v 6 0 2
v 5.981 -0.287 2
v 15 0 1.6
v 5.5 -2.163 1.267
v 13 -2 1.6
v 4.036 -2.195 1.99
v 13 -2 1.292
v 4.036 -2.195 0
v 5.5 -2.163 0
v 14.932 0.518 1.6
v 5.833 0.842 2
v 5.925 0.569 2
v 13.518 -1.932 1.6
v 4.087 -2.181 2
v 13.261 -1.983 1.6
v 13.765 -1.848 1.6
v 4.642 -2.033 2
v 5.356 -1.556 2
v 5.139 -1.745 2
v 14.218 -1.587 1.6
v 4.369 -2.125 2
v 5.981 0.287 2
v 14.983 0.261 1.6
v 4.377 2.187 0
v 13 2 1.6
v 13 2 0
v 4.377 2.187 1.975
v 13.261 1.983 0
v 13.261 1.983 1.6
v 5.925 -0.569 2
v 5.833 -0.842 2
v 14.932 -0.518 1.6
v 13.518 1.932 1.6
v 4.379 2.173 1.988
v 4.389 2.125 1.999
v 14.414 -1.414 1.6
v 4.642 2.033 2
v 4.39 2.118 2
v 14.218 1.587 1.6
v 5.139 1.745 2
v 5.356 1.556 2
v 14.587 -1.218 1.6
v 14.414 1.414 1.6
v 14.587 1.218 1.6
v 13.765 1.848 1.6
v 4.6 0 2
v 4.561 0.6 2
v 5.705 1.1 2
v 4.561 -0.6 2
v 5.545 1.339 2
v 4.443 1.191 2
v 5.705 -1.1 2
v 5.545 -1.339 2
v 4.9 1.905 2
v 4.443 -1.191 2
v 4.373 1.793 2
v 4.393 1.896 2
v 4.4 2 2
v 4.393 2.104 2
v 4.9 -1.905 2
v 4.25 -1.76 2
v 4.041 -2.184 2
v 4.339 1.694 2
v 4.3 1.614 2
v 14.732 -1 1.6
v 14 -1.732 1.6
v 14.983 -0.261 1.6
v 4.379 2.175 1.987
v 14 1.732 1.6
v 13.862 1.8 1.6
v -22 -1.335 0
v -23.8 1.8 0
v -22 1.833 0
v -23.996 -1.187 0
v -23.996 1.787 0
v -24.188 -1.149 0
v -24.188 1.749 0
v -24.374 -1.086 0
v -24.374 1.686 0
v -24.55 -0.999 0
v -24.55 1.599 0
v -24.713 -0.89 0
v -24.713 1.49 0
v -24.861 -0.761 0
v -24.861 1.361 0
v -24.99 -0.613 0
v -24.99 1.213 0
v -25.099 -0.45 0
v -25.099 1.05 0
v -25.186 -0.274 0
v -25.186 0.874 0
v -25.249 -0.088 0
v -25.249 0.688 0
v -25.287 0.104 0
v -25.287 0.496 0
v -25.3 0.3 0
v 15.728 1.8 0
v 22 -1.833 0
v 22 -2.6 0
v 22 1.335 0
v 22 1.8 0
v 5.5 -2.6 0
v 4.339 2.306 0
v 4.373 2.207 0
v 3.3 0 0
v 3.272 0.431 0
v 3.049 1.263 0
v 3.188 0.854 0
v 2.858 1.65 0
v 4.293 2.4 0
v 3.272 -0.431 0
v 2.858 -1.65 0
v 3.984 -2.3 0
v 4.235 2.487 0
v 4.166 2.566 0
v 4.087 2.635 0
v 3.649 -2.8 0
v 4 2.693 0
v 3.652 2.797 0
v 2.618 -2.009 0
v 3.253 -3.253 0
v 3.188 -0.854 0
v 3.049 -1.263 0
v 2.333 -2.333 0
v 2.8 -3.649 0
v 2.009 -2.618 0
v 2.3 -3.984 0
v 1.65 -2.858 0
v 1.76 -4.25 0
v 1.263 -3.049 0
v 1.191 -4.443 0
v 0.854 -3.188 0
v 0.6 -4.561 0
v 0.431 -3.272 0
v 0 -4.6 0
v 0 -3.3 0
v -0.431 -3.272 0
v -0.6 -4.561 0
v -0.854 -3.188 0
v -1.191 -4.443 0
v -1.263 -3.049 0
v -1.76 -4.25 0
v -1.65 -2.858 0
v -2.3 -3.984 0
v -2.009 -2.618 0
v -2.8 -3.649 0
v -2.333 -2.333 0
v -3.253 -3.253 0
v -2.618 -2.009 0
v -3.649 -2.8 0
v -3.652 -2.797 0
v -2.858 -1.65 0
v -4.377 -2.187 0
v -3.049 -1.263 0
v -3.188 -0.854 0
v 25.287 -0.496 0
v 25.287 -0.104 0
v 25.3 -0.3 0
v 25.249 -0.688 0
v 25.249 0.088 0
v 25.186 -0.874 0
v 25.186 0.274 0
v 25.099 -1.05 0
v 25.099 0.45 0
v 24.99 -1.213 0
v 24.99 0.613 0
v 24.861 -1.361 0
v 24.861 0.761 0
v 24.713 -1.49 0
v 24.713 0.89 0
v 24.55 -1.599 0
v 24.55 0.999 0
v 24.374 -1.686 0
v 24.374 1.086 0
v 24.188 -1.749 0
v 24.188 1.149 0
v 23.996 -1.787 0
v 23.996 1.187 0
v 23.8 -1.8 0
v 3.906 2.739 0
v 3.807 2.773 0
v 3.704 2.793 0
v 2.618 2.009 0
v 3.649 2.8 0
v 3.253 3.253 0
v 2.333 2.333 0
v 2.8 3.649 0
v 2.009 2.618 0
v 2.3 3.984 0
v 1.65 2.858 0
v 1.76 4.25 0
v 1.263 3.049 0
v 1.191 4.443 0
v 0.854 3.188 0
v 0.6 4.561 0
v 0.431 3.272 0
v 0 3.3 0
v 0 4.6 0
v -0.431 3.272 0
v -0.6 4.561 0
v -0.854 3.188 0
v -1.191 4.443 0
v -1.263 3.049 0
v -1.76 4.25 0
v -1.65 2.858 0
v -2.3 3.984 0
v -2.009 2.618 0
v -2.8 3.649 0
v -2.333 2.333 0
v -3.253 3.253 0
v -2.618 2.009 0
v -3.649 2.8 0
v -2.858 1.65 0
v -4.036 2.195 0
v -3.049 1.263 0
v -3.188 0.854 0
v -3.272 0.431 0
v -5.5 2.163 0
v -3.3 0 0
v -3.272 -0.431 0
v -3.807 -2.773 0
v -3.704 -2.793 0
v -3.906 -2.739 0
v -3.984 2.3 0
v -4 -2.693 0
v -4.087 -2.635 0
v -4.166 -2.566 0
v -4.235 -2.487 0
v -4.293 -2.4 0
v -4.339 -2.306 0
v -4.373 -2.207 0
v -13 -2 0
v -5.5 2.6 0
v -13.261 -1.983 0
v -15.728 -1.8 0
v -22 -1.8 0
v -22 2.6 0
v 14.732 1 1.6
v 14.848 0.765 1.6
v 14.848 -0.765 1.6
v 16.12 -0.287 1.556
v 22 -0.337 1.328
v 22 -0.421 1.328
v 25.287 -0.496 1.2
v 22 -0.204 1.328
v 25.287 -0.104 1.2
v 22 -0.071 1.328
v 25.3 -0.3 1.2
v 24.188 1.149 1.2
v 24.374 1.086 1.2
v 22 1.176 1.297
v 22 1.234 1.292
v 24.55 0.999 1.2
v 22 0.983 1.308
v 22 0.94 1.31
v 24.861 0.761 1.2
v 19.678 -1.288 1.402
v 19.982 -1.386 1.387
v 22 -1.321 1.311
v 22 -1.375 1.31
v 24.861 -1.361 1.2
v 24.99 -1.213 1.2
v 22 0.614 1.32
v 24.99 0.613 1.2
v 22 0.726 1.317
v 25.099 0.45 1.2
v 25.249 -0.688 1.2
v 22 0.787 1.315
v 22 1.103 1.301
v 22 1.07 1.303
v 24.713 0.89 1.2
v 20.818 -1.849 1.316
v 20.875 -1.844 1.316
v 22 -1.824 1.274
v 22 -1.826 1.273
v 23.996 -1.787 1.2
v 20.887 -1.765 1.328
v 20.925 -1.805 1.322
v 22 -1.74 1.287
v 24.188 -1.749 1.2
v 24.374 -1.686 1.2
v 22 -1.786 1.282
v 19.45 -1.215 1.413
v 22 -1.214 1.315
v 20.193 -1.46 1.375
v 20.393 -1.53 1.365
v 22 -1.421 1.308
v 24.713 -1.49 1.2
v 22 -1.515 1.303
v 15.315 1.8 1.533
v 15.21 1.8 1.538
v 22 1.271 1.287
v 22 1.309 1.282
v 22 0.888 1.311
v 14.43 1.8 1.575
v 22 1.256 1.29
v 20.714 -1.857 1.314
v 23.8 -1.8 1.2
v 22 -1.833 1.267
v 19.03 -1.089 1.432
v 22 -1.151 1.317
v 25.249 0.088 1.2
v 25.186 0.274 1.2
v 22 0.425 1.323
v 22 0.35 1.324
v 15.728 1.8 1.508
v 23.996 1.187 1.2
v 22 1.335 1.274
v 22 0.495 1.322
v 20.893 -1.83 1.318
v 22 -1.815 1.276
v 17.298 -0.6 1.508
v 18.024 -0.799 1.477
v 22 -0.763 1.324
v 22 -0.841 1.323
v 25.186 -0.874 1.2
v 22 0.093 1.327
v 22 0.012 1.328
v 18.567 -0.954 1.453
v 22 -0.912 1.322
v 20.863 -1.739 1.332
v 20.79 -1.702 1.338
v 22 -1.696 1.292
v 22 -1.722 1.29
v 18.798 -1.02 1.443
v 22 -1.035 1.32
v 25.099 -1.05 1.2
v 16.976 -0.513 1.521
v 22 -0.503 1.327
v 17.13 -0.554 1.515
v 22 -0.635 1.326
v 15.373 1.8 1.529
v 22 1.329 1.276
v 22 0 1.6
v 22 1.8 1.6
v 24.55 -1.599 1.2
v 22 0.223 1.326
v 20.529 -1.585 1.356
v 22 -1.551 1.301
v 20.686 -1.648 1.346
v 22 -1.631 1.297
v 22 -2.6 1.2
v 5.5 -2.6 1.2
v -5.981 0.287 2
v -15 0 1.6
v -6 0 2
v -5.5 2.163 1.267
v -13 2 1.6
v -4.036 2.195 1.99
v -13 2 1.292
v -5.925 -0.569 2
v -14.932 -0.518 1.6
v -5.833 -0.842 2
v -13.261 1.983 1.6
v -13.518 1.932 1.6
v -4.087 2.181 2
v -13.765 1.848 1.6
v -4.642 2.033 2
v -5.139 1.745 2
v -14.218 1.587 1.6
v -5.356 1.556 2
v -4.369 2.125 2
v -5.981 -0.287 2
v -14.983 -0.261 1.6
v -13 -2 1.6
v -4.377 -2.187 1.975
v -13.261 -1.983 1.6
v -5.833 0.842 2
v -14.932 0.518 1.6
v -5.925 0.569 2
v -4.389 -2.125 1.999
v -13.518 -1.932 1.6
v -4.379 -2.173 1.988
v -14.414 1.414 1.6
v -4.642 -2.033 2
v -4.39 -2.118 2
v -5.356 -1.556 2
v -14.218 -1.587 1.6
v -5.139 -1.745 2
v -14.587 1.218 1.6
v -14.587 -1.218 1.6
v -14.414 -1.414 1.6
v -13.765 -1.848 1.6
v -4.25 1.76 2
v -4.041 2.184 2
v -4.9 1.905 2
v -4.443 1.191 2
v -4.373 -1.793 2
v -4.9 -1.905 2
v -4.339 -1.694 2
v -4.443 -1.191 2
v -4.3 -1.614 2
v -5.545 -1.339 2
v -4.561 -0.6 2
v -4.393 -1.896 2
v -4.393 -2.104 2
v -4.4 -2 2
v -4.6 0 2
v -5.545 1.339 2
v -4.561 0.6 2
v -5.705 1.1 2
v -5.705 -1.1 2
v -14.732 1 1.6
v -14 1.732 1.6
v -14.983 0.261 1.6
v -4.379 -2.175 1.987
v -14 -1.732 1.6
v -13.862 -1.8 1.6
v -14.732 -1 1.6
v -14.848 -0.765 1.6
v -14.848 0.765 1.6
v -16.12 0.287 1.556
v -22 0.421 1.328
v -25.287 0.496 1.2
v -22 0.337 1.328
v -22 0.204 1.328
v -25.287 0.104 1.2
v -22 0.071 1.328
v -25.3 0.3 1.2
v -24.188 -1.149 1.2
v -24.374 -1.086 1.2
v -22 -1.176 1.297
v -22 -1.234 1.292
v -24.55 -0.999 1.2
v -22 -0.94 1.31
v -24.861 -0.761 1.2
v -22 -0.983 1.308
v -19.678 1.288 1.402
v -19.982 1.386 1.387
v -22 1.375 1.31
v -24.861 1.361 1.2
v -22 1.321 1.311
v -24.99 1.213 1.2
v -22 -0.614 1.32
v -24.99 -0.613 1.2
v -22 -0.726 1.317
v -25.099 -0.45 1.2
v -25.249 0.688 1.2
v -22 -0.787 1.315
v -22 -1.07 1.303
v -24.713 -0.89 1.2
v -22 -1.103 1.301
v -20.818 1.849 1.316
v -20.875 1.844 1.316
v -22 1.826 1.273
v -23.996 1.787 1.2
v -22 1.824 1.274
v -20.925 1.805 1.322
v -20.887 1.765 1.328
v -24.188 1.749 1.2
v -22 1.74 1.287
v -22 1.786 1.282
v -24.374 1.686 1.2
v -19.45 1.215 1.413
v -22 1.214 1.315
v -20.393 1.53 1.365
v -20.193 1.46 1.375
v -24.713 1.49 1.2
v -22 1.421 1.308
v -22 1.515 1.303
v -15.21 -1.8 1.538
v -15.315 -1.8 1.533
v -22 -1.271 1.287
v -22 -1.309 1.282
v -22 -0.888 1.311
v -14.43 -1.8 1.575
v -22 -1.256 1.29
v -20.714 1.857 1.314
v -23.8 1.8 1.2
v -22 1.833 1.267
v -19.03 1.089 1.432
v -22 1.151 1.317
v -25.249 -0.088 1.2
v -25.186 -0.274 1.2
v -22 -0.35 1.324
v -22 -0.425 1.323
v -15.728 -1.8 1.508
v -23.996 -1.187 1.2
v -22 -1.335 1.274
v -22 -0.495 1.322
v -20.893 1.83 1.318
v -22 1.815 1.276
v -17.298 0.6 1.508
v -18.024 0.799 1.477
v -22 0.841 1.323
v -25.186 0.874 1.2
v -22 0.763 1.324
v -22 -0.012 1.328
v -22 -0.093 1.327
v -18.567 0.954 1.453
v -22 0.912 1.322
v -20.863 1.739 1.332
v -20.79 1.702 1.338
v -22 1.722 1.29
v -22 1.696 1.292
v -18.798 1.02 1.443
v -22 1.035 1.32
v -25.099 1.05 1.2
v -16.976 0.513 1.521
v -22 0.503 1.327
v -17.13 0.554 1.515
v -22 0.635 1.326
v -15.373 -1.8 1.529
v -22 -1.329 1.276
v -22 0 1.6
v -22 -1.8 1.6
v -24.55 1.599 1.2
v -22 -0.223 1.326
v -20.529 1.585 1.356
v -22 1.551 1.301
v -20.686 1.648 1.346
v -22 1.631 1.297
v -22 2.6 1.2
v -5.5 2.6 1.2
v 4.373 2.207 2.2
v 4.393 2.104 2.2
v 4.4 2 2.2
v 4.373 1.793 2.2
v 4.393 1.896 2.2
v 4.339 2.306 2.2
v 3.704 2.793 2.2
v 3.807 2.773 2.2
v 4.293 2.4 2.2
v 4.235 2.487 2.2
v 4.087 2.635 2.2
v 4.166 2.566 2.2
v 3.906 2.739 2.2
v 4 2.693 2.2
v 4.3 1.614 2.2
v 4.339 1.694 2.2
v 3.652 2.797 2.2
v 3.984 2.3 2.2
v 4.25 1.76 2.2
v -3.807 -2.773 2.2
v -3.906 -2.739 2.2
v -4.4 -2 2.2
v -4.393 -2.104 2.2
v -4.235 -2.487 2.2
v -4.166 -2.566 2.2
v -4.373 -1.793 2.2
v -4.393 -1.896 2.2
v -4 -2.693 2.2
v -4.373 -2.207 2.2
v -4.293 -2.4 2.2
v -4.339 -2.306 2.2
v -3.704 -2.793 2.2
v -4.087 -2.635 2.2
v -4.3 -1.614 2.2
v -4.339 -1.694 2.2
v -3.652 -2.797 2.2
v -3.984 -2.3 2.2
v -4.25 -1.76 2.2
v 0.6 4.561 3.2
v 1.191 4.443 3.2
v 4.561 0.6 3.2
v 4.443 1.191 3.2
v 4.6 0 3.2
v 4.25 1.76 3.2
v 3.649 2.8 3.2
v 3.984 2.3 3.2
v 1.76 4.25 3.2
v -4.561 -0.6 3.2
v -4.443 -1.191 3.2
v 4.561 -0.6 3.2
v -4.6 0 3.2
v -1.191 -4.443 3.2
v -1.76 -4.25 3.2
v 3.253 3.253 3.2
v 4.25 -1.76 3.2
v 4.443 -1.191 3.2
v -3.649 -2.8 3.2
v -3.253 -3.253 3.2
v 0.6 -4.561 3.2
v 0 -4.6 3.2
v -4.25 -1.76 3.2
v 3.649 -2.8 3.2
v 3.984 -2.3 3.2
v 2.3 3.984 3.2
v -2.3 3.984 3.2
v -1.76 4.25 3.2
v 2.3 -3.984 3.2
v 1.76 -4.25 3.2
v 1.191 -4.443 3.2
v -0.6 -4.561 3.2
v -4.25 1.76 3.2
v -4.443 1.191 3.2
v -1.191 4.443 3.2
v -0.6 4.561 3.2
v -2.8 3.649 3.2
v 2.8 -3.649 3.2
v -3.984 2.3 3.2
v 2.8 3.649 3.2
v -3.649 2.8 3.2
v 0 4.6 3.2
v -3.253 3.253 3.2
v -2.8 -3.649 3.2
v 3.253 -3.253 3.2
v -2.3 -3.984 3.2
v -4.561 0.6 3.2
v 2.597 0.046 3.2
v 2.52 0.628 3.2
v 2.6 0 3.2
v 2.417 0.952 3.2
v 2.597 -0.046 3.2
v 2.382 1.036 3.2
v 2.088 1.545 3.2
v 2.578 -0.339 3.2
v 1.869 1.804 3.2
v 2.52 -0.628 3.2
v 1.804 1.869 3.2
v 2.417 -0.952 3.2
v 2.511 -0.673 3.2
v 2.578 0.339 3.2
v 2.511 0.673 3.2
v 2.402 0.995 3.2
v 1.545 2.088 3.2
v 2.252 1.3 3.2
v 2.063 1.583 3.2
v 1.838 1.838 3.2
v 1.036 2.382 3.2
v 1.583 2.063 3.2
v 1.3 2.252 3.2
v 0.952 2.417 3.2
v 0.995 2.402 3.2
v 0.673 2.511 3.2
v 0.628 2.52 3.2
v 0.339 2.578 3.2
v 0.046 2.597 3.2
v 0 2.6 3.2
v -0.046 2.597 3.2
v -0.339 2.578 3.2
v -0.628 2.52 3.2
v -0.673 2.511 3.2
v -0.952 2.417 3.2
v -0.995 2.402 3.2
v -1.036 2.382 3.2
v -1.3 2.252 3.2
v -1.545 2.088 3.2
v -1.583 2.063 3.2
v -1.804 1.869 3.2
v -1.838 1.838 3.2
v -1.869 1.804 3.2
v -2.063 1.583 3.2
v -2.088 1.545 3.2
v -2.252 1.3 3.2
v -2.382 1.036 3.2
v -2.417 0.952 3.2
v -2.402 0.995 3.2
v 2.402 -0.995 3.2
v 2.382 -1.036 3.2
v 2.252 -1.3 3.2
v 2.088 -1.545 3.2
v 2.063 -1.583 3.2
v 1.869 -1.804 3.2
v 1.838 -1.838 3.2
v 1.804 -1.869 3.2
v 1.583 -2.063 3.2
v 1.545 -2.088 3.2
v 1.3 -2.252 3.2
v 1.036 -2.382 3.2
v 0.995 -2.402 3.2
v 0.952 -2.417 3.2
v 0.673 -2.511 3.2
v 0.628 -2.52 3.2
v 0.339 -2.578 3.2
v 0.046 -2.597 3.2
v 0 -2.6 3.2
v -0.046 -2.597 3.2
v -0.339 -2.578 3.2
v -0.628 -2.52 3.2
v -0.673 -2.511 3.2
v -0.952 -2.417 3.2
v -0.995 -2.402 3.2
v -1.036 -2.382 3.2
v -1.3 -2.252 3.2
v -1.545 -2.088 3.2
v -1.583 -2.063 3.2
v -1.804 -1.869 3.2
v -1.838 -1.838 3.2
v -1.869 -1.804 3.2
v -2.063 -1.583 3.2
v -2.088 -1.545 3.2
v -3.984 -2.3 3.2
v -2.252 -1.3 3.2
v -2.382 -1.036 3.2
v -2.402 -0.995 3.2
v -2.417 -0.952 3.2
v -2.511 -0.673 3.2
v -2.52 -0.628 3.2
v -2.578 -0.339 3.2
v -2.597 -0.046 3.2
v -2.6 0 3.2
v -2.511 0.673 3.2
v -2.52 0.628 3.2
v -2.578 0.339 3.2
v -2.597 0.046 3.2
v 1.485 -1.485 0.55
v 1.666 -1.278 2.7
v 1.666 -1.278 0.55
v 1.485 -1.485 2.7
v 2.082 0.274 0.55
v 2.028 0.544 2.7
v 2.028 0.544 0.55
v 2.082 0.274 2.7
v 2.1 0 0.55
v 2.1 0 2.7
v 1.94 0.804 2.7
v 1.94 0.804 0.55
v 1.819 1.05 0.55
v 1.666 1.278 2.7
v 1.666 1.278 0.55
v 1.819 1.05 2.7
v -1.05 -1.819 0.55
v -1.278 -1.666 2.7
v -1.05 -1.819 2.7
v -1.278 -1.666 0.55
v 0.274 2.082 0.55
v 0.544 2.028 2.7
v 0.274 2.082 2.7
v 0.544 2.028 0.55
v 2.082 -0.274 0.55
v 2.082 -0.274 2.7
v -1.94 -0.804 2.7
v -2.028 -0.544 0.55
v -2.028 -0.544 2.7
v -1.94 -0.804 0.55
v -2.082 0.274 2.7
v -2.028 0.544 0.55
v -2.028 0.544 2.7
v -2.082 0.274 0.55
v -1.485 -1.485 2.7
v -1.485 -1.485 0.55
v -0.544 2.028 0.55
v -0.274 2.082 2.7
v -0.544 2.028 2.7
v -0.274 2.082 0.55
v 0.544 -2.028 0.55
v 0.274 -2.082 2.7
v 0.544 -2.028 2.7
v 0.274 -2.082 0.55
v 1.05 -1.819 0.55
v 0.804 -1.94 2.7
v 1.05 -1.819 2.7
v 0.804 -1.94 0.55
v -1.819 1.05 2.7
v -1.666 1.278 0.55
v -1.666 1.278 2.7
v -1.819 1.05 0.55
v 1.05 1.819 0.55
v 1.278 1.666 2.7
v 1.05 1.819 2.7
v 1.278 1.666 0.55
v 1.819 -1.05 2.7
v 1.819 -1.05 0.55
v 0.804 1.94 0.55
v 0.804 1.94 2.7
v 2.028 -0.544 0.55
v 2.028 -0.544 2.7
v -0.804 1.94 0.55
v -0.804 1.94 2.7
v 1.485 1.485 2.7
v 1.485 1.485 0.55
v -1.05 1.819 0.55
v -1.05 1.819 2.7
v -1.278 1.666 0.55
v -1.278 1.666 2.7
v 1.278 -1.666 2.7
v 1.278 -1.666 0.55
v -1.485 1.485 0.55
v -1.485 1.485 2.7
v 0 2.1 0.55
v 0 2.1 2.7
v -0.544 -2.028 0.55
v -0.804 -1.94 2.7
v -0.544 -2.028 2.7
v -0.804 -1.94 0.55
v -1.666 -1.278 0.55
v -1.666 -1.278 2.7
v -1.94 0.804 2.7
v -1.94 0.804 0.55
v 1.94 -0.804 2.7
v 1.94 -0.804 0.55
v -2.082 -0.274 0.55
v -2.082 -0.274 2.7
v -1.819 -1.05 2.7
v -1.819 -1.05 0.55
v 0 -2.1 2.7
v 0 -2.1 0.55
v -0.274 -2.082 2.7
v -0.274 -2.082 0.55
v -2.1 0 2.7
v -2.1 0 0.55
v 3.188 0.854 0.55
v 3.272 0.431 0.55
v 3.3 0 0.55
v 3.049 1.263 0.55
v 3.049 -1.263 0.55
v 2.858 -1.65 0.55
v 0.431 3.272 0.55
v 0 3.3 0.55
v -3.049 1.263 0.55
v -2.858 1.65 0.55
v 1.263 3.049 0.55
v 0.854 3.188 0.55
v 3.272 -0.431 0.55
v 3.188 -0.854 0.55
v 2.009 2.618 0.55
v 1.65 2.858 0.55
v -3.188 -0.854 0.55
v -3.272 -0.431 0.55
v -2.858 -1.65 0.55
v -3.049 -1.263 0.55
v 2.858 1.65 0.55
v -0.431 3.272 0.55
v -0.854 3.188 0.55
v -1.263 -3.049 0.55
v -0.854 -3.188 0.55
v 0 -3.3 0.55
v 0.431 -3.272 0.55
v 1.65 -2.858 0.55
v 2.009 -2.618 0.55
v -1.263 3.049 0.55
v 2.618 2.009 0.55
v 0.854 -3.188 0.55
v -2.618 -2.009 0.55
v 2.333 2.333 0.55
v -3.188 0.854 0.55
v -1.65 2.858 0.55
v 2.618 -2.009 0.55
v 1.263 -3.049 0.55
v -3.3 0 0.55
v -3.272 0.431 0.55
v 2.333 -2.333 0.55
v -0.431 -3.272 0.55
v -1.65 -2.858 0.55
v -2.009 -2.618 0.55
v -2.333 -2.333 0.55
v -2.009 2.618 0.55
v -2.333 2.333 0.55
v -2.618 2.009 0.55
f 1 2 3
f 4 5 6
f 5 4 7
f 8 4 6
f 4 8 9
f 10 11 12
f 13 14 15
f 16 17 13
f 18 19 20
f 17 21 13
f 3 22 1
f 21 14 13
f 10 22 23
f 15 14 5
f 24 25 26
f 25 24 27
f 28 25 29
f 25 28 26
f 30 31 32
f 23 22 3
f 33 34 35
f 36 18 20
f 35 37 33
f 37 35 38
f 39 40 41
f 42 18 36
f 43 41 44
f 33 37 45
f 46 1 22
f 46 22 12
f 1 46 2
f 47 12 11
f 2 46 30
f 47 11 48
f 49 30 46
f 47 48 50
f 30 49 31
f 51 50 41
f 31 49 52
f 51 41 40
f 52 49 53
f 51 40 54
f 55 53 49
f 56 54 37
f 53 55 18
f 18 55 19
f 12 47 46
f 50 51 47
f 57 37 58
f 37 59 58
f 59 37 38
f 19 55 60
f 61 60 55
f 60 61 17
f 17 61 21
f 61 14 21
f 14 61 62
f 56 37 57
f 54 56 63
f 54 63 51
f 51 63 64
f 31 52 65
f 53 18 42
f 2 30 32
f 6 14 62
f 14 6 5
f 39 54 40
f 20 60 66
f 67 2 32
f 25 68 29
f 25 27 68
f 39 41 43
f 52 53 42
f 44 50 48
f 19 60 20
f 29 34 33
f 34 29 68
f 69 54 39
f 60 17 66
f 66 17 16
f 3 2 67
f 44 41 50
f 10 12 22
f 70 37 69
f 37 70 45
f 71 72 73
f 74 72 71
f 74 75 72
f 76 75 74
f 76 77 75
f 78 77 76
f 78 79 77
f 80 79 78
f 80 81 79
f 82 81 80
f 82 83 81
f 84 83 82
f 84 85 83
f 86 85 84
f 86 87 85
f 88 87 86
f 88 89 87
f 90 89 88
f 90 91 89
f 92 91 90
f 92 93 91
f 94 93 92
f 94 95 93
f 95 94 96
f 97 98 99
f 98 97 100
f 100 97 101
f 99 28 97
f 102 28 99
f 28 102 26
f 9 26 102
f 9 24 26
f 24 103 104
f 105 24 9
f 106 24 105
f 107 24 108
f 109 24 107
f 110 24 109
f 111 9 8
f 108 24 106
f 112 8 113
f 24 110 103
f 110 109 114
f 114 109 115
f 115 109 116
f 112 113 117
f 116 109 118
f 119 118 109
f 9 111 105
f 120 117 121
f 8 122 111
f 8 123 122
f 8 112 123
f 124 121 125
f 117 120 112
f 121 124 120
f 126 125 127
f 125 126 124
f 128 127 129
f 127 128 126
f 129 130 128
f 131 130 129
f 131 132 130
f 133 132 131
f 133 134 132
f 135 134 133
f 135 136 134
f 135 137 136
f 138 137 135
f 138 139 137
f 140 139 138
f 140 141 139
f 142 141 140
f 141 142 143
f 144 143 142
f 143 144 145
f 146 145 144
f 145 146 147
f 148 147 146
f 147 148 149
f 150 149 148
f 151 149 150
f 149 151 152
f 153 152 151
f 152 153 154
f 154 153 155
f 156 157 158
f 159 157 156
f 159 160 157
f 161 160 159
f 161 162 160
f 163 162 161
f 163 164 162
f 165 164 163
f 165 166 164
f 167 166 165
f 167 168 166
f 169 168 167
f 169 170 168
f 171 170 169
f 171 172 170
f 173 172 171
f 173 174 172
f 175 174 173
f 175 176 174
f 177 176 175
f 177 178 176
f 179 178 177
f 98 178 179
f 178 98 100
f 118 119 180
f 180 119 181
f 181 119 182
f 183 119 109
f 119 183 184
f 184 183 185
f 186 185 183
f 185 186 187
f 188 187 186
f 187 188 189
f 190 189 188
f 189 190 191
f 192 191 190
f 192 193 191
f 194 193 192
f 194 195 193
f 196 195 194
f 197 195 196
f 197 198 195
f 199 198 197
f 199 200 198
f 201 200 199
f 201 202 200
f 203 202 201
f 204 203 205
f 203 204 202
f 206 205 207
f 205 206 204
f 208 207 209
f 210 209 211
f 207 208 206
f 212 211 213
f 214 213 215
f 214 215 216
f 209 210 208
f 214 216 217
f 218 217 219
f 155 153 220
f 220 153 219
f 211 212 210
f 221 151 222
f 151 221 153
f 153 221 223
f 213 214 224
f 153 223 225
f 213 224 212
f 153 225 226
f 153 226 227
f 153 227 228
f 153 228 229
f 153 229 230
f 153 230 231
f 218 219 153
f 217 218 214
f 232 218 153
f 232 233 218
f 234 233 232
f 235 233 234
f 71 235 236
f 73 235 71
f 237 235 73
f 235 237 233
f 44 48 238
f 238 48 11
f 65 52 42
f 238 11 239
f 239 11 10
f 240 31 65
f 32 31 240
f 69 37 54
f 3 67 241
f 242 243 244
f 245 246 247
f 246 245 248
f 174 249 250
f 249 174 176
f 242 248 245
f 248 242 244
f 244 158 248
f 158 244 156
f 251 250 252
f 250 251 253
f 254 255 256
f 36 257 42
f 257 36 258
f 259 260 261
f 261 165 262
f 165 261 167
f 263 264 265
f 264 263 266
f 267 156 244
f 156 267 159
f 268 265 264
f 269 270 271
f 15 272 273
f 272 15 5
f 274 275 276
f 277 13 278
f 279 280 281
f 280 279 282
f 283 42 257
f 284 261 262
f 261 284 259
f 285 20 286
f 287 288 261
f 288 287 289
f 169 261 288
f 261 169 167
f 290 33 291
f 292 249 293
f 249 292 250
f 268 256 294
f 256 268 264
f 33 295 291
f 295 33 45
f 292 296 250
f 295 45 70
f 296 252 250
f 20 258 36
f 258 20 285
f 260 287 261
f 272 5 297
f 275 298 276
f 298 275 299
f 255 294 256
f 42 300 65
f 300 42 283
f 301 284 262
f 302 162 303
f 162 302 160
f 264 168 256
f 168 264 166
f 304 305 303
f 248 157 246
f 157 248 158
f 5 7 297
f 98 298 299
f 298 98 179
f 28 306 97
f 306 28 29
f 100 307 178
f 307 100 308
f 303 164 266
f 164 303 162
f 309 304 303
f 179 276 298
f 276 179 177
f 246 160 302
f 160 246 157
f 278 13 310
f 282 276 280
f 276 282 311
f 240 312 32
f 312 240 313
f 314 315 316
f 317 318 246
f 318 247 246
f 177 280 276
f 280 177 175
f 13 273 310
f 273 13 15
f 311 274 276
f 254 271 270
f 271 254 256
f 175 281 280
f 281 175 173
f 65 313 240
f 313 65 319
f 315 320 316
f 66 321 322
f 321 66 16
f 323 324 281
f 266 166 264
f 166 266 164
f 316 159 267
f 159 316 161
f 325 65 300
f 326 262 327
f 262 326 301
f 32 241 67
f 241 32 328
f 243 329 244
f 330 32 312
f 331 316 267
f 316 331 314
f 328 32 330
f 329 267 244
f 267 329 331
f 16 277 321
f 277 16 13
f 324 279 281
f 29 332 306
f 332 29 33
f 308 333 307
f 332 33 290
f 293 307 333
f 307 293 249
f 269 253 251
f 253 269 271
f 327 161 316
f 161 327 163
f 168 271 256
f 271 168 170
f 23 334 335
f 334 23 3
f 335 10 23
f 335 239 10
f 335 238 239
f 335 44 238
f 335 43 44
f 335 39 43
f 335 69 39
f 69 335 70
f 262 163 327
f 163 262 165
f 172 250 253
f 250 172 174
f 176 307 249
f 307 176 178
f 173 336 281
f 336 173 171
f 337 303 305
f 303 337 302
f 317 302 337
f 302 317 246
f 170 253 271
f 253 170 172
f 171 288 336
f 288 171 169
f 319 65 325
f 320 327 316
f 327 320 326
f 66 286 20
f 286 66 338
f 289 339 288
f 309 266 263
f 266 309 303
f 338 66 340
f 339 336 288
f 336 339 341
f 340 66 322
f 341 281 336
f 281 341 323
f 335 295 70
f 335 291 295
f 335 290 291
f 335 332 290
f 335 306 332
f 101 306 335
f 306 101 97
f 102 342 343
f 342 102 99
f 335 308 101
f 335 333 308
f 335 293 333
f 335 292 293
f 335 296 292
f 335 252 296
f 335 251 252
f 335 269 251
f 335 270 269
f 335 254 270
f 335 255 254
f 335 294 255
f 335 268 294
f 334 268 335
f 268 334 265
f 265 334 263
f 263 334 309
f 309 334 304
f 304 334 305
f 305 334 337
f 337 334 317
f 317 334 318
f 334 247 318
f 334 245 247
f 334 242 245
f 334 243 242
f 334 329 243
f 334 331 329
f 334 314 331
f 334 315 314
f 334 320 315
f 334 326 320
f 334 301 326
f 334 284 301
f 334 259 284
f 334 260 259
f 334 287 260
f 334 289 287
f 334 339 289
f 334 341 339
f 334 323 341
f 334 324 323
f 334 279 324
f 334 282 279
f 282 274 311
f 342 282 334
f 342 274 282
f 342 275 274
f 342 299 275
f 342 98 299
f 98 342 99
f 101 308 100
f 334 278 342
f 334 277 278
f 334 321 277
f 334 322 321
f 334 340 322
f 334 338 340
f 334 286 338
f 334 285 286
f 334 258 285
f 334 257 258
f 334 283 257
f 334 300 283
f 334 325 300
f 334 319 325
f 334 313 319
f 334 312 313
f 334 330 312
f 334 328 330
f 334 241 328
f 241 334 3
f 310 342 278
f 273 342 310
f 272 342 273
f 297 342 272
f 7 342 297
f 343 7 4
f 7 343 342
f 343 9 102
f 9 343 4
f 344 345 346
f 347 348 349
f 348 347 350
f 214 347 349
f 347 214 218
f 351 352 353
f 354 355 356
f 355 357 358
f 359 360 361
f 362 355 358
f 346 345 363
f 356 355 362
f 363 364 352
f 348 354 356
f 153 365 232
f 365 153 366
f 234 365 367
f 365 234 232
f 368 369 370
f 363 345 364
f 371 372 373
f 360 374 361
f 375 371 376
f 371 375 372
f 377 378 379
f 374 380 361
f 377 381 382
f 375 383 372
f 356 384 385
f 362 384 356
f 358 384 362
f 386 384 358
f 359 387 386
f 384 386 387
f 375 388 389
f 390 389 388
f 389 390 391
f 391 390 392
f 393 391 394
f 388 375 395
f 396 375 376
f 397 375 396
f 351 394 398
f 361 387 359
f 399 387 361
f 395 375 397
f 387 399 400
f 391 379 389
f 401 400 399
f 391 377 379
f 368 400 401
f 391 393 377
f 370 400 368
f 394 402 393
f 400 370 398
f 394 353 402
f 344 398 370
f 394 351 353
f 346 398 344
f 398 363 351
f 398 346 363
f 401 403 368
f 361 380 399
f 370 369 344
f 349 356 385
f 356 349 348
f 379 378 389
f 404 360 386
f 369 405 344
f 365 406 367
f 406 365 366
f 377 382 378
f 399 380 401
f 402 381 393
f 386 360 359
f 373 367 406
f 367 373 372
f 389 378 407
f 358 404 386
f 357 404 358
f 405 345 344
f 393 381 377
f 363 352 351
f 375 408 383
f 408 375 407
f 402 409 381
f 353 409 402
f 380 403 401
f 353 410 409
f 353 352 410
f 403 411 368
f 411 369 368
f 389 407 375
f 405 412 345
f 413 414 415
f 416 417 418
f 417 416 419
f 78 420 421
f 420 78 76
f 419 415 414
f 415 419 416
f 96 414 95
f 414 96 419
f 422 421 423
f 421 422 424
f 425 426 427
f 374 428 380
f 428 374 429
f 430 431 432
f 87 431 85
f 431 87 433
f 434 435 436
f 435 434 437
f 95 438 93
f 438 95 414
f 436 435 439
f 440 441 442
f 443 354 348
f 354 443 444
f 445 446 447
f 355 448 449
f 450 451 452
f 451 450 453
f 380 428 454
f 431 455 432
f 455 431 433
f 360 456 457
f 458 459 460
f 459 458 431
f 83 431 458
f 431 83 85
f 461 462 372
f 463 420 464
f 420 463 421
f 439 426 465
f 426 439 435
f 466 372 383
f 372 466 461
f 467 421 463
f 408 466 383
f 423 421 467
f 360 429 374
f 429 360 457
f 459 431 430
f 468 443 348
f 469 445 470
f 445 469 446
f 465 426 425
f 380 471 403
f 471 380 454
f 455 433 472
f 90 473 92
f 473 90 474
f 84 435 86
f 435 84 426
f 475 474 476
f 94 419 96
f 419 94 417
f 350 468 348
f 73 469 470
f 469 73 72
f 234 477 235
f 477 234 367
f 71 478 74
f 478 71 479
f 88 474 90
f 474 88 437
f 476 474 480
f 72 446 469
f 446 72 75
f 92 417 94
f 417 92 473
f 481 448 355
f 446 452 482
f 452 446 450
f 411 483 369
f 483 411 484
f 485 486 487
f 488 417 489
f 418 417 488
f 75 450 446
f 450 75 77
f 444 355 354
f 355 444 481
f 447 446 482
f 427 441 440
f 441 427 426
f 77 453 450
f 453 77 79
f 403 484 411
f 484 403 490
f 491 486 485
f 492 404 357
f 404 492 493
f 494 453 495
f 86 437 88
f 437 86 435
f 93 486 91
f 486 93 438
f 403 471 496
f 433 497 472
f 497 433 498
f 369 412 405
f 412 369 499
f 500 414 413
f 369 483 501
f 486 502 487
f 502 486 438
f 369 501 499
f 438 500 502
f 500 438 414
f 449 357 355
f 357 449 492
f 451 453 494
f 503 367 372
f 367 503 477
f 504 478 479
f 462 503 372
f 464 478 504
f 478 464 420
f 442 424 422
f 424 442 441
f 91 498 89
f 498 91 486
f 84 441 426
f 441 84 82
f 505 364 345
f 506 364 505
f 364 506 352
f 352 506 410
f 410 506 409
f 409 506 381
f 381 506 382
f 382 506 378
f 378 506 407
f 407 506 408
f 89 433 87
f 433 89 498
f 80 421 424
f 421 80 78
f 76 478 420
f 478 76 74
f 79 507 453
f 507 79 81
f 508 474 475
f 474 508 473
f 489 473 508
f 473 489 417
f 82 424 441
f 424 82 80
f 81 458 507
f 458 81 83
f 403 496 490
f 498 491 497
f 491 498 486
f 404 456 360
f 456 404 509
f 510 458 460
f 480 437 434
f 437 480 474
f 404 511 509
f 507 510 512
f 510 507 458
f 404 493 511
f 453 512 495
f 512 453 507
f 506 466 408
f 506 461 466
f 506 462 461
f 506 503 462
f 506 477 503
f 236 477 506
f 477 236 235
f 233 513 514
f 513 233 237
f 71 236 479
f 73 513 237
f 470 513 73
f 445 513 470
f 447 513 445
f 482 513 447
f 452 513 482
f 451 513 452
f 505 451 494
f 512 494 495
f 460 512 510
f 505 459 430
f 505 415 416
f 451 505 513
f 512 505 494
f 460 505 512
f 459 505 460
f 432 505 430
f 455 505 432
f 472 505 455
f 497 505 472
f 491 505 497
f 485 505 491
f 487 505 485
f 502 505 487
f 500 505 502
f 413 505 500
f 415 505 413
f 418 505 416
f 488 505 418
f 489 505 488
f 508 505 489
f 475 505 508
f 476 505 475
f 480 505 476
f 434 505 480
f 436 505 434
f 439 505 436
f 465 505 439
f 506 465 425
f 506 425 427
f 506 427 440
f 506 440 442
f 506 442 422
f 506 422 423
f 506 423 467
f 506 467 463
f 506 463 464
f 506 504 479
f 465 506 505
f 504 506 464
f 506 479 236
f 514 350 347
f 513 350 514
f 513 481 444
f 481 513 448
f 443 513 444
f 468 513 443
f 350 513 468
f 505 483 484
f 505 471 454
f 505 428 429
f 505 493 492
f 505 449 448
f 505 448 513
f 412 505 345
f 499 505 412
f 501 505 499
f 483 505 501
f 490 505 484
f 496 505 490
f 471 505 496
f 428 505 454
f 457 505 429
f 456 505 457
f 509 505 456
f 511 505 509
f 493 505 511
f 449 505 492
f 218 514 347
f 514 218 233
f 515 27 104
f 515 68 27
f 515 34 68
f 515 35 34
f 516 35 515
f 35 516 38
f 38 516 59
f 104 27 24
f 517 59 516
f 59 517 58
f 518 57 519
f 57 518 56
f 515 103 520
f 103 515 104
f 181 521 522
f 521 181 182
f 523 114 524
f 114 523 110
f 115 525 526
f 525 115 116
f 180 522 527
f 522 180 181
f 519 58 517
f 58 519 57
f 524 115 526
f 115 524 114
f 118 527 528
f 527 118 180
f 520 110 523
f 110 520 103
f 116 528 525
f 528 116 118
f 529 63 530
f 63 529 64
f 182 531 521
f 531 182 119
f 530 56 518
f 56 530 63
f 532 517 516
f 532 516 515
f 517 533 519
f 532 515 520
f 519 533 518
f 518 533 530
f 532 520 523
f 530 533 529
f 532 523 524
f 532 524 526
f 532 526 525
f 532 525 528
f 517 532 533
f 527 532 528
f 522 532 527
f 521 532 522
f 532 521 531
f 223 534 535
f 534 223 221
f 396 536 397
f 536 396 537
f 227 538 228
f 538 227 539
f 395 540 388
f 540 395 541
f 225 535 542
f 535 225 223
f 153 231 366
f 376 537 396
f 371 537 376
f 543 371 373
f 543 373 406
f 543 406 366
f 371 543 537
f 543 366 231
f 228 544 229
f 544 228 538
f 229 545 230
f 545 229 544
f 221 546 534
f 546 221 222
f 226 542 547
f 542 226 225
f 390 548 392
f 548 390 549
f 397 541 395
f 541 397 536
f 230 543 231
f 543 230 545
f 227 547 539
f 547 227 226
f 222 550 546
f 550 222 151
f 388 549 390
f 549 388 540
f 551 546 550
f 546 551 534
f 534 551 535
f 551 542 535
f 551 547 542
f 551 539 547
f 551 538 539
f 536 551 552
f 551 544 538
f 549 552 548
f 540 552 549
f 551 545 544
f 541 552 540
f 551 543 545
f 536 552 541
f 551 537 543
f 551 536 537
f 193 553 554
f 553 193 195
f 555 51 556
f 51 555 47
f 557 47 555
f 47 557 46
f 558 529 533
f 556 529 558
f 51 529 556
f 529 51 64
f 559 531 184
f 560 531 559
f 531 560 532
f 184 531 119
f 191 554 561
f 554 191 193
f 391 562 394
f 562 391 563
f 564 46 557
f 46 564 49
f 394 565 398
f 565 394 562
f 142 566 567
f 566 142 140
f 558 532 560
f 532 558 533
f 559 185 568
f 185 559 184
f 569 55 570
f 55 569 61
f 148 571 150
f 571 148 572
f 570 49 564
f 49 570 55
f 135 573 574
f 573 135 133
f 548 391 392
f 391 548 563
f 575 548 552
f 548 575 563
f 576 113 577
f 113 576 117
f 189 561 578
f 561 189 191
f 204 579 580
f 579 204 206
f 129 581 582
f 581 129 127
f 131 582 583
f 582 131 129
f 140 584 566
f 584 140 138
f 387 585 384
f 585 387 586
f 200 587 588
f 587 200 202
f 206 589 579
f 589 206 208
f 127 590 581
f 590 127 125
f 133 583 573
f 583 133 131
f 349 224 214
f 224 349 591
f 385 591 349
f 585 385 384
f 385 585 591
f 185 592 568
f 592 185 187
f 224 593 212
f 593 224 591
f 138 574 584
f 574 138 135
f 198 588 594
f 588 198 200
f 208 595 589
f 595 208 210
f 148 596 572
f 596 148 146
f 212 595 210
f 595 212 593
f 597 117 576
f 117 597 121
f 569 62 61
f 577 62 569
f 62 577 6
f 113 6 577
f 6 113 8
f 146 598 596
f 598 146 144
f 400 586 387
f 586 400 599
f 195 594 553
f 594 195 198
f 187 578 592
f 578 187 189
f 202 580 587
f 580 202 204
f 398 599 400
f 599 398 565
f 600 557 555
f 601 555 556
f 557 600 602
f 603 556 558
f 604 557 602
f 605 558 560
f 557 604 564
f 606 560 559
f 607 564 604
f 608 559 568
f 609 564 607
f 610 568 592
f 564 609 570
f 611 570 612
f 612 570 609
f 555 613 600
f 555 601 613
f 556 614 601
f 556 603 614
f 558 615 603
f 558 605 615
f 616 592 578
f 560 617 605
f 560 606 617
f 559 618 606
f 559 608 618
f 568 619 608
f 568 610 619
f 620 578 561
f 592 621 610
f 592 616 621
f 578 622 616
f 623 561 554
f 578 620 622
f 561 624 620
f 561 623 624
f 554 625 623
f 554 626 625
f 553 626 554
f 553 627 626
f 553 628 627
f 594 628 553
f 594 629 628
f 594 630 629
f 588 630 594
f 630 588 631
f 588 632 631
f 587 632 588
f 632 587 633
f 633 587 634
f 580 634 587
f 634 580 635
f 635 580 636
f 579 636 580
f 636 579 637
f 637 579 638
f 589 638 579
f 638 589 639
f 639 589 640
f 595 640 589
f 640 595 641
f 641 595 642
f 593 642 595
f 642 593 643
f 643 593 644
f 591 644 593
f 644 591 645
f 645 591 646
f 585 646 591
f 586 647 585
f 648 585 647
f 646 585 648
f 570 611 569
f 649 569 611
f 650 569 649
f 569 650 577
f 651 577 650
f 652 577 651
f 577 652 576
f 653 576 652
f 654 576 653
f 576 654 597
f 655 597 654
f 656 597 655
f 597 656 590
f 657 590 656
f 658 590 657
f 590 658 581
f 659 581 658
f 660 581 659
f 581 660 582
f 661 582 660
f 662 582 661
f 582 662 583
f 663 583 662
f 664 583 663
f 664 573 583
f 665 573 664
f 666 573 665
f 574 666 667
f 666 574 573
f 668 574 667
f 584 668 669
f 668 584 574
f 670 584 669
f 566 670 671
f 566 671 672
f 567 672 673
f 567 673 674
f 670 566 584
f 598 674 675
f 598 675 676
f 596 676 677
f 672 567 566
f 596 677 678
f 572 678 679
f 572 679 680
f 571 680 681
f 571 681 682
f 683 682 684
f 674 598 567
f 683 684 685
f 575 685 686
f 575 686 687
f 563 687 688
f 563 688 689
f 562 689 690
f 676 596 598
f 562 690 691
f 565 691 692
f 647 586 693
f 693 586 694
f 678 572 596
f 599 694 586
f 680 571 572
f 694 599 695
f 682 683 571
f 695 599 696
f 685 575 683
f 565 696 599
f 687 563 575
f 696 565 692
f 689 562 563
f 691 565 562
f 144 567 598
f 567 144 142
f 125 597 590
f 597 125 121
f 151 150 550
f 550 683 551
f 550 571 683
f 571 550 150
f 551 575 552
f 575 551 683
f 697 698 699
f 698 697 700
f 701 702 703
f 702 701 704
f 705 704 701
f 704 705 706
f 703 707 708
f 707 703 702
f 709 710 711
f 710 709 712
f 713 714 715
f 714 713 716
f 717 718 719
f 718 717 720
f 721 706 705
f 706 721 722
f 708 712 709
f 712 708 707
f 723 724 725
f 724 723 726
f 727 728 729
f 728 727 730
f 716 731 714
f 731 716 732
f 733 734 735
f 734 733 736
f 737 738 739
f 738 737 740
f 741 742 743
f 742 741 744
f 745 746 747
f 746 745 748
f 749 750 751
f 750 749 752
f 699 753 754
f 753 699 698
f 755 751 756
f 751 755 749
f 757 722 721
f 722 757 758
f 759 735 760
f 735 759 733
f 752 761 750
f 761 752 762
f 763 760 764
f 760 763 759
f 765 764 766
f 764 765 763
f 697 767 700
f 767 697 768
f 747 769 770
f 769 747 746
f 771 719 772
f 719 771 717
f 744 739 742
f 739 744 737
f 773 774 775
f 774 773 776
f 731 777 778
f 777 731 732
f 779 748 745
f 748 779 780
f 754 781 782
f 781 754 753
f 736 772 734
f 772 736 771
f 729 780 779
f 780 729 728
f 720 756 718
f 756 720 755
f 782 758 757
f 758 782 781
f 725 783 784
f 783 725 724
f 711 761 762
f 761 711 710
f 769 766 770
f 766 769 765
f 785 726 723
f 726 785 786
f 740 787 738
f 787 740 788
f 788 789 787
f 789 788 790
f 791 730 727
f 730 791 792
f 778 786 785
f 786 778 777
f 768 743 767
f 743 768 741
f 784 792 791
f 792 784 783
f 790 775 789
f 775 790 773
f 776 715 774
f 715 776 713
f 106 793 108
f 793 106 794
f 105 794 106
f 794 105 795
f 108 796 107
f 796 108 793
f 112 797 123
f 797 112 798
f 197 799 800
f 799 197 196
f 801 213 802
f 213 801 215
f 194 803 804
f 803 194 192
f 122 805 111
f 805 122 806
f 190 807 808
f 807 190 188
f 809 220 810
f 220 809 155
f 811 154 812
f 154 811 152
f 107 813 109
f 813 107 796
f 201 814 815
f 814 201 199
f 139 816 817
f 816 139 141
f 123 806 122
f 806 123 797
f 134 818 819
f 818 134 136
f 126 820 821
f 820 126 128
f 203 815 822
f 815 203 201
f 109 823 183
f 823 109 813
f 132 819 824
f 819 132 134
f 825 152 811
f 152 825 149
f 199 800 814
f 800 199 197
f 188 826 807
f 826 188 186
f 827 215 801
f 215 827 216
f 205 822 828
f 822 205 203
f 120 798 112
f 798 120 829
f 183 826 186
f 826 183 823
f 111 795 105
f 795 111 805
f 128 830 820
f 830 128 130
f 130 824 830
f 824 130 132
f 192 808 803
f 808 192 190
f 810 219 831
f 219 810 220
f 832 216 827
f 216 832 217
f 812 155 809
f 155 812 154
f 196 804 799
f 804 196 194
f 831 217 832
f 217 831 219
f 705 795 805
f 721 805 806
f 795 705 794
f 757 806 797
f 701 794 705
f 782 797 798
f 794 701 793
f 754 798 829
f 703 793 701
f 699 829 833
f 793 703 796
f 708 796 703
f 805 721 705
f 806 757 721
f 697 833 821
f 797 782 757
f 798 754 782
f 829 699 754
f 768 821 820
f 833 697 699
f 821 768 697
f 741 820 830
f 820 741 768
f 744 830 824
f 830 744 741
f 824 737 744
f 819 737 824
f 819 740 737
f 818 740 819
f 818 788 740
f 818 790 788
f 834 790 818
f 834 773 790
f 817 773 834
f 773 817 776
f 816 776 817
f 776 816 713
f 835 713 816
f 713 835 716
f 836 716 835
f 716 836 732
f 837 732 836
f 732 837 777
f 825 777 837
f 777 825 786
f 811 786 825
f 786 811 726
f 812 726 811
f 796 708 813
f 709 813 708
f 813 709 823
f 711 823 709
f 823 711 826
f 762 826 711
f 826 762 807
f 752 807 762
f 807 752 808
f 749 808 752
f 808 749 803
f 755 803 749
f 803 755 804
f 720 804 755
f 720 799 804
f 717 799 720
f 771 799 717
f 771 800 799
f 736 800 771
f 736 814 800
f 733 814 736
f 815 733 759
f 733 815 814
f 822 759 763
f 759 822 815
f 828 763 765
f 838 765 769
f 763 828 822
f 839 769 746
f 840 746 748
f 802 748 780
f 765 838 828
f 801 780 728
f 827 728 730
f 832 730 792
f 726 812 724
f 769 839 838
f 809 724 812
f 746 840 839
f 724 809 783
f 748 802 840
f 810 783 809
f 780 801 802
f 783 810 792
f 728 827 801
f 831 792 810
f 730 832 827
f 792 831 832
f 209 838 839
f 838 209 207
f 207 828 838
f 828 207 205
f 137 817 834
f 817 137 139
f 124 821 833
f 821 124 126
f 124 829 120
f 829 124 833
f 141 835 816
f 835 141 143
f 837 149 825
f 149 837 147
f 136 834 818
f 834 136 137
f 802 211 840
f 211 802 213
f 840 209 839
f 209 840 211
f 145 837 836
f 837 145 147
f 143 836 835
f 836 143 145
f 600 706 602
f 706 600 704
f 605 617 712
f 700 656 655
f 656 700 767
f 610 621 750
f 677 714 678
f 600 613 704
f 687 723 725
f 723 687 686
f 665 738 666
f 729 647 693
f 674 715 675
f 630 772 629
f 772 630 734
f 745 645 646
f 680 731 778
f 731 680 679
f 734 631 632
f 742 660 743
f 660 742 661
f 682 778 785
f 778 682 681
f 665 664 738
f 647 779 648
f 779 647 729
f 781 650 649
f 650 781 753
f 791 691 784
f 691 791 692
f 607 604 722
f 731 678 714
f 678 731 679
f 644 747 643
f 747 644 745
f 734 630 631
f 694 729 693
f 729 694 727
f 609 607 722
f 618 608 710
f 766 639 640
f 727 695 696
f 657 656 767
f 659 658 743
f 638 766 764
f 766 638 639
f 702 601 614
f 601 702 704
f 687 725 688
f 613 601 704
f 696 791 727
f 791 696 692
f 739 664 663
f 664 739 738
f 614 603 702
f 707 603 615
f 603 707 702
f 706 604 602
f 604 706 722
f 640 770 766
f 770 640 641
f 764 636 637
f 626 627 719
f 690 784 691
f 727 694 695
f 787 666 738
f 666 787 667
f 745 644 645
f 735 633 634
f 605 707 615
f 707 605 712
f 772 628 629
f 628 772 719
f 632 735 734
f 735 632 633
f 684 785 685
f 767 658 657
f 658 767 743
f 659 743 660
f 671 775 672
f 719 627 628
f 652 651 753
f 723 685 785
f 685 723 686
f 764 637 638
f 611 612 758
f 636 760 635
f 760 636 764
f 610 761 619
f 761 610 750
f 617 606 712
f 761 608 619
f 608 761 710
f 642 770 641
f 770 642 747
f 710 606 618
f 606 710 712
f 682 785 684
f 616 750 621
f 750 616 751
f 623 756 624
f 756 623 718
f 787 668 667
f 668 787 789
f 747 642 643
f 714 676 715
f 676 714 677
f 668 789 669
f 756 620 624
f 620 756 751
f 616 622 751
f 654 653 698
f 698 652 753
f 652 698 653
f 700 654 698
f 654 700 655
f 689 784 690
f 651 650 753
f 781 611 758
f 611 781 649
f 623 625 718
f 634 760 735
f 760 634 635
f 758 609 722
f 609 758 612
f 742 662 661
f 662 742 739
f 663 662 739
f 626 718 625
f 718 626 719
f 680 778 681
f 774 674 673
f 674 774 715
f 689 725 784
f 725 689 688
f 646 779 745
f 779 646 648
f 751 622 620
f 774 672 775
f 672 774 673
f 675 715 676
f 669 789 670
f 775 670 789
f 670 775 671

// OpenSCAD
// ====================================================================
// Modular Rotatable Chopper Rotor (50mm / 5.0 cm Swept Diameter)
// Matches 5.0 cm Modular Chopper Standard.
//
// Engineering Specifications:
// - Swept Diameter: 50.0 mm (Radius: 25.0 mm)
// - Hub Diameter: 9.2 mm, Hub Height: 3.2 mm
// - Axle Bore: 4.2 mm through-hole (for 3.6 mm pin -> 0.6mm clearance)
// - Low-friction underside relief pocket (reduces bearing drag)
// - Aerodynamic blade profile with reinforced root cuffs
// - 100% supportless flat print at Z = 0
// - Configurable blade count (2-blade scout standard or 3-blade heavy lift)
// ====================================================================

$fn = 48;

blade_count = 2; // 2 for high-speed scout, 3 for heavy-lift

module rotor_blade(r = 25.0) {
    hull() {
        // Root cuff near hub
        translate([3.8, 0, 0])
            cylinder(r = 2.2, h = 2.0, center = false);
        // Mid span
        translate([13.0, 0, 0])
            cylinder(r = 2.0, h = 1.6, center = false);
    }
    hull() {
        // Mid span
        translate([13.0, 0, 0])
            cylinder(r = 2.0, h = 1.6, center = false);
        // Blade tip (swept taper)
        translate([r - 1.2, -0.3, 0])
            cylinder(r = 1.5, h = 1.2, center = false);
    }
    // Trailing edge airfoil taper
    hull() {
        translate([5.5, -2.6, 0])
            cube([r - 8.5, 0.6, 1.2]);
        translate([5.5, 0, 0])
            cube([r - 8.5, 1.8, 1.6]);
    }
}

module rotatable_rotor(blades = 2, bore_d = 4.2) {
    hub_r = 4.6;
    hub_h = 3.2;
    angle_step = 360 / blades;

    difference() {
        union() {
            // Central Hub
            cylinder(r = hub_r, h = hub_h, center = false);

            // Hub top bevel ring
            translate([0, 0, hub_h - 0.6])
                cylinder(r1 = hub_r, r2 = hub_r - 0.6, h = 0.6, center = false);

            // Blades
            for (i = [0 : blades - 1]) {
                rotate([0, 0, i * angle_step])
                    rotor_blade(25.0);
            }

            // Pitch control hinge details
            for (i = [0 : blades - 1]) {
                rotate([0, 0, i * angle_step])
                    translate([3.6, 2.0, 0])
                        cylinder(r = 0.8, h = 2.2, center = false);
            }
        }

        // Center axle bore for rotatable pin (clearance gap for smooth spinning)
        translate([0, 0, -0.1])
            cylinder(d = bore_d, h = hub_h + 0.2, center = false);

        // Underside low-friction bearing recess
        // Relieves inner surface so only outer rim contacts the mast collar
        translate([0, 0, -0.05])
            cylinder(d = 6.6, h = 0.6, center = false);

        // Top chamfer on bore for easy pin insertion
        translate([0, 0, hub_h - 0.5])
            cylinder(r1 = bore_d/2, r2 = bore_d/2 + 0.6, h = 0.6, center = false);
    }
}

// Default standalone render (2-blade rotor flat on print bed)
translate([0, 0, 0])
    rotatable_rotor(blades = blade_count, bore_d = 4.2);
